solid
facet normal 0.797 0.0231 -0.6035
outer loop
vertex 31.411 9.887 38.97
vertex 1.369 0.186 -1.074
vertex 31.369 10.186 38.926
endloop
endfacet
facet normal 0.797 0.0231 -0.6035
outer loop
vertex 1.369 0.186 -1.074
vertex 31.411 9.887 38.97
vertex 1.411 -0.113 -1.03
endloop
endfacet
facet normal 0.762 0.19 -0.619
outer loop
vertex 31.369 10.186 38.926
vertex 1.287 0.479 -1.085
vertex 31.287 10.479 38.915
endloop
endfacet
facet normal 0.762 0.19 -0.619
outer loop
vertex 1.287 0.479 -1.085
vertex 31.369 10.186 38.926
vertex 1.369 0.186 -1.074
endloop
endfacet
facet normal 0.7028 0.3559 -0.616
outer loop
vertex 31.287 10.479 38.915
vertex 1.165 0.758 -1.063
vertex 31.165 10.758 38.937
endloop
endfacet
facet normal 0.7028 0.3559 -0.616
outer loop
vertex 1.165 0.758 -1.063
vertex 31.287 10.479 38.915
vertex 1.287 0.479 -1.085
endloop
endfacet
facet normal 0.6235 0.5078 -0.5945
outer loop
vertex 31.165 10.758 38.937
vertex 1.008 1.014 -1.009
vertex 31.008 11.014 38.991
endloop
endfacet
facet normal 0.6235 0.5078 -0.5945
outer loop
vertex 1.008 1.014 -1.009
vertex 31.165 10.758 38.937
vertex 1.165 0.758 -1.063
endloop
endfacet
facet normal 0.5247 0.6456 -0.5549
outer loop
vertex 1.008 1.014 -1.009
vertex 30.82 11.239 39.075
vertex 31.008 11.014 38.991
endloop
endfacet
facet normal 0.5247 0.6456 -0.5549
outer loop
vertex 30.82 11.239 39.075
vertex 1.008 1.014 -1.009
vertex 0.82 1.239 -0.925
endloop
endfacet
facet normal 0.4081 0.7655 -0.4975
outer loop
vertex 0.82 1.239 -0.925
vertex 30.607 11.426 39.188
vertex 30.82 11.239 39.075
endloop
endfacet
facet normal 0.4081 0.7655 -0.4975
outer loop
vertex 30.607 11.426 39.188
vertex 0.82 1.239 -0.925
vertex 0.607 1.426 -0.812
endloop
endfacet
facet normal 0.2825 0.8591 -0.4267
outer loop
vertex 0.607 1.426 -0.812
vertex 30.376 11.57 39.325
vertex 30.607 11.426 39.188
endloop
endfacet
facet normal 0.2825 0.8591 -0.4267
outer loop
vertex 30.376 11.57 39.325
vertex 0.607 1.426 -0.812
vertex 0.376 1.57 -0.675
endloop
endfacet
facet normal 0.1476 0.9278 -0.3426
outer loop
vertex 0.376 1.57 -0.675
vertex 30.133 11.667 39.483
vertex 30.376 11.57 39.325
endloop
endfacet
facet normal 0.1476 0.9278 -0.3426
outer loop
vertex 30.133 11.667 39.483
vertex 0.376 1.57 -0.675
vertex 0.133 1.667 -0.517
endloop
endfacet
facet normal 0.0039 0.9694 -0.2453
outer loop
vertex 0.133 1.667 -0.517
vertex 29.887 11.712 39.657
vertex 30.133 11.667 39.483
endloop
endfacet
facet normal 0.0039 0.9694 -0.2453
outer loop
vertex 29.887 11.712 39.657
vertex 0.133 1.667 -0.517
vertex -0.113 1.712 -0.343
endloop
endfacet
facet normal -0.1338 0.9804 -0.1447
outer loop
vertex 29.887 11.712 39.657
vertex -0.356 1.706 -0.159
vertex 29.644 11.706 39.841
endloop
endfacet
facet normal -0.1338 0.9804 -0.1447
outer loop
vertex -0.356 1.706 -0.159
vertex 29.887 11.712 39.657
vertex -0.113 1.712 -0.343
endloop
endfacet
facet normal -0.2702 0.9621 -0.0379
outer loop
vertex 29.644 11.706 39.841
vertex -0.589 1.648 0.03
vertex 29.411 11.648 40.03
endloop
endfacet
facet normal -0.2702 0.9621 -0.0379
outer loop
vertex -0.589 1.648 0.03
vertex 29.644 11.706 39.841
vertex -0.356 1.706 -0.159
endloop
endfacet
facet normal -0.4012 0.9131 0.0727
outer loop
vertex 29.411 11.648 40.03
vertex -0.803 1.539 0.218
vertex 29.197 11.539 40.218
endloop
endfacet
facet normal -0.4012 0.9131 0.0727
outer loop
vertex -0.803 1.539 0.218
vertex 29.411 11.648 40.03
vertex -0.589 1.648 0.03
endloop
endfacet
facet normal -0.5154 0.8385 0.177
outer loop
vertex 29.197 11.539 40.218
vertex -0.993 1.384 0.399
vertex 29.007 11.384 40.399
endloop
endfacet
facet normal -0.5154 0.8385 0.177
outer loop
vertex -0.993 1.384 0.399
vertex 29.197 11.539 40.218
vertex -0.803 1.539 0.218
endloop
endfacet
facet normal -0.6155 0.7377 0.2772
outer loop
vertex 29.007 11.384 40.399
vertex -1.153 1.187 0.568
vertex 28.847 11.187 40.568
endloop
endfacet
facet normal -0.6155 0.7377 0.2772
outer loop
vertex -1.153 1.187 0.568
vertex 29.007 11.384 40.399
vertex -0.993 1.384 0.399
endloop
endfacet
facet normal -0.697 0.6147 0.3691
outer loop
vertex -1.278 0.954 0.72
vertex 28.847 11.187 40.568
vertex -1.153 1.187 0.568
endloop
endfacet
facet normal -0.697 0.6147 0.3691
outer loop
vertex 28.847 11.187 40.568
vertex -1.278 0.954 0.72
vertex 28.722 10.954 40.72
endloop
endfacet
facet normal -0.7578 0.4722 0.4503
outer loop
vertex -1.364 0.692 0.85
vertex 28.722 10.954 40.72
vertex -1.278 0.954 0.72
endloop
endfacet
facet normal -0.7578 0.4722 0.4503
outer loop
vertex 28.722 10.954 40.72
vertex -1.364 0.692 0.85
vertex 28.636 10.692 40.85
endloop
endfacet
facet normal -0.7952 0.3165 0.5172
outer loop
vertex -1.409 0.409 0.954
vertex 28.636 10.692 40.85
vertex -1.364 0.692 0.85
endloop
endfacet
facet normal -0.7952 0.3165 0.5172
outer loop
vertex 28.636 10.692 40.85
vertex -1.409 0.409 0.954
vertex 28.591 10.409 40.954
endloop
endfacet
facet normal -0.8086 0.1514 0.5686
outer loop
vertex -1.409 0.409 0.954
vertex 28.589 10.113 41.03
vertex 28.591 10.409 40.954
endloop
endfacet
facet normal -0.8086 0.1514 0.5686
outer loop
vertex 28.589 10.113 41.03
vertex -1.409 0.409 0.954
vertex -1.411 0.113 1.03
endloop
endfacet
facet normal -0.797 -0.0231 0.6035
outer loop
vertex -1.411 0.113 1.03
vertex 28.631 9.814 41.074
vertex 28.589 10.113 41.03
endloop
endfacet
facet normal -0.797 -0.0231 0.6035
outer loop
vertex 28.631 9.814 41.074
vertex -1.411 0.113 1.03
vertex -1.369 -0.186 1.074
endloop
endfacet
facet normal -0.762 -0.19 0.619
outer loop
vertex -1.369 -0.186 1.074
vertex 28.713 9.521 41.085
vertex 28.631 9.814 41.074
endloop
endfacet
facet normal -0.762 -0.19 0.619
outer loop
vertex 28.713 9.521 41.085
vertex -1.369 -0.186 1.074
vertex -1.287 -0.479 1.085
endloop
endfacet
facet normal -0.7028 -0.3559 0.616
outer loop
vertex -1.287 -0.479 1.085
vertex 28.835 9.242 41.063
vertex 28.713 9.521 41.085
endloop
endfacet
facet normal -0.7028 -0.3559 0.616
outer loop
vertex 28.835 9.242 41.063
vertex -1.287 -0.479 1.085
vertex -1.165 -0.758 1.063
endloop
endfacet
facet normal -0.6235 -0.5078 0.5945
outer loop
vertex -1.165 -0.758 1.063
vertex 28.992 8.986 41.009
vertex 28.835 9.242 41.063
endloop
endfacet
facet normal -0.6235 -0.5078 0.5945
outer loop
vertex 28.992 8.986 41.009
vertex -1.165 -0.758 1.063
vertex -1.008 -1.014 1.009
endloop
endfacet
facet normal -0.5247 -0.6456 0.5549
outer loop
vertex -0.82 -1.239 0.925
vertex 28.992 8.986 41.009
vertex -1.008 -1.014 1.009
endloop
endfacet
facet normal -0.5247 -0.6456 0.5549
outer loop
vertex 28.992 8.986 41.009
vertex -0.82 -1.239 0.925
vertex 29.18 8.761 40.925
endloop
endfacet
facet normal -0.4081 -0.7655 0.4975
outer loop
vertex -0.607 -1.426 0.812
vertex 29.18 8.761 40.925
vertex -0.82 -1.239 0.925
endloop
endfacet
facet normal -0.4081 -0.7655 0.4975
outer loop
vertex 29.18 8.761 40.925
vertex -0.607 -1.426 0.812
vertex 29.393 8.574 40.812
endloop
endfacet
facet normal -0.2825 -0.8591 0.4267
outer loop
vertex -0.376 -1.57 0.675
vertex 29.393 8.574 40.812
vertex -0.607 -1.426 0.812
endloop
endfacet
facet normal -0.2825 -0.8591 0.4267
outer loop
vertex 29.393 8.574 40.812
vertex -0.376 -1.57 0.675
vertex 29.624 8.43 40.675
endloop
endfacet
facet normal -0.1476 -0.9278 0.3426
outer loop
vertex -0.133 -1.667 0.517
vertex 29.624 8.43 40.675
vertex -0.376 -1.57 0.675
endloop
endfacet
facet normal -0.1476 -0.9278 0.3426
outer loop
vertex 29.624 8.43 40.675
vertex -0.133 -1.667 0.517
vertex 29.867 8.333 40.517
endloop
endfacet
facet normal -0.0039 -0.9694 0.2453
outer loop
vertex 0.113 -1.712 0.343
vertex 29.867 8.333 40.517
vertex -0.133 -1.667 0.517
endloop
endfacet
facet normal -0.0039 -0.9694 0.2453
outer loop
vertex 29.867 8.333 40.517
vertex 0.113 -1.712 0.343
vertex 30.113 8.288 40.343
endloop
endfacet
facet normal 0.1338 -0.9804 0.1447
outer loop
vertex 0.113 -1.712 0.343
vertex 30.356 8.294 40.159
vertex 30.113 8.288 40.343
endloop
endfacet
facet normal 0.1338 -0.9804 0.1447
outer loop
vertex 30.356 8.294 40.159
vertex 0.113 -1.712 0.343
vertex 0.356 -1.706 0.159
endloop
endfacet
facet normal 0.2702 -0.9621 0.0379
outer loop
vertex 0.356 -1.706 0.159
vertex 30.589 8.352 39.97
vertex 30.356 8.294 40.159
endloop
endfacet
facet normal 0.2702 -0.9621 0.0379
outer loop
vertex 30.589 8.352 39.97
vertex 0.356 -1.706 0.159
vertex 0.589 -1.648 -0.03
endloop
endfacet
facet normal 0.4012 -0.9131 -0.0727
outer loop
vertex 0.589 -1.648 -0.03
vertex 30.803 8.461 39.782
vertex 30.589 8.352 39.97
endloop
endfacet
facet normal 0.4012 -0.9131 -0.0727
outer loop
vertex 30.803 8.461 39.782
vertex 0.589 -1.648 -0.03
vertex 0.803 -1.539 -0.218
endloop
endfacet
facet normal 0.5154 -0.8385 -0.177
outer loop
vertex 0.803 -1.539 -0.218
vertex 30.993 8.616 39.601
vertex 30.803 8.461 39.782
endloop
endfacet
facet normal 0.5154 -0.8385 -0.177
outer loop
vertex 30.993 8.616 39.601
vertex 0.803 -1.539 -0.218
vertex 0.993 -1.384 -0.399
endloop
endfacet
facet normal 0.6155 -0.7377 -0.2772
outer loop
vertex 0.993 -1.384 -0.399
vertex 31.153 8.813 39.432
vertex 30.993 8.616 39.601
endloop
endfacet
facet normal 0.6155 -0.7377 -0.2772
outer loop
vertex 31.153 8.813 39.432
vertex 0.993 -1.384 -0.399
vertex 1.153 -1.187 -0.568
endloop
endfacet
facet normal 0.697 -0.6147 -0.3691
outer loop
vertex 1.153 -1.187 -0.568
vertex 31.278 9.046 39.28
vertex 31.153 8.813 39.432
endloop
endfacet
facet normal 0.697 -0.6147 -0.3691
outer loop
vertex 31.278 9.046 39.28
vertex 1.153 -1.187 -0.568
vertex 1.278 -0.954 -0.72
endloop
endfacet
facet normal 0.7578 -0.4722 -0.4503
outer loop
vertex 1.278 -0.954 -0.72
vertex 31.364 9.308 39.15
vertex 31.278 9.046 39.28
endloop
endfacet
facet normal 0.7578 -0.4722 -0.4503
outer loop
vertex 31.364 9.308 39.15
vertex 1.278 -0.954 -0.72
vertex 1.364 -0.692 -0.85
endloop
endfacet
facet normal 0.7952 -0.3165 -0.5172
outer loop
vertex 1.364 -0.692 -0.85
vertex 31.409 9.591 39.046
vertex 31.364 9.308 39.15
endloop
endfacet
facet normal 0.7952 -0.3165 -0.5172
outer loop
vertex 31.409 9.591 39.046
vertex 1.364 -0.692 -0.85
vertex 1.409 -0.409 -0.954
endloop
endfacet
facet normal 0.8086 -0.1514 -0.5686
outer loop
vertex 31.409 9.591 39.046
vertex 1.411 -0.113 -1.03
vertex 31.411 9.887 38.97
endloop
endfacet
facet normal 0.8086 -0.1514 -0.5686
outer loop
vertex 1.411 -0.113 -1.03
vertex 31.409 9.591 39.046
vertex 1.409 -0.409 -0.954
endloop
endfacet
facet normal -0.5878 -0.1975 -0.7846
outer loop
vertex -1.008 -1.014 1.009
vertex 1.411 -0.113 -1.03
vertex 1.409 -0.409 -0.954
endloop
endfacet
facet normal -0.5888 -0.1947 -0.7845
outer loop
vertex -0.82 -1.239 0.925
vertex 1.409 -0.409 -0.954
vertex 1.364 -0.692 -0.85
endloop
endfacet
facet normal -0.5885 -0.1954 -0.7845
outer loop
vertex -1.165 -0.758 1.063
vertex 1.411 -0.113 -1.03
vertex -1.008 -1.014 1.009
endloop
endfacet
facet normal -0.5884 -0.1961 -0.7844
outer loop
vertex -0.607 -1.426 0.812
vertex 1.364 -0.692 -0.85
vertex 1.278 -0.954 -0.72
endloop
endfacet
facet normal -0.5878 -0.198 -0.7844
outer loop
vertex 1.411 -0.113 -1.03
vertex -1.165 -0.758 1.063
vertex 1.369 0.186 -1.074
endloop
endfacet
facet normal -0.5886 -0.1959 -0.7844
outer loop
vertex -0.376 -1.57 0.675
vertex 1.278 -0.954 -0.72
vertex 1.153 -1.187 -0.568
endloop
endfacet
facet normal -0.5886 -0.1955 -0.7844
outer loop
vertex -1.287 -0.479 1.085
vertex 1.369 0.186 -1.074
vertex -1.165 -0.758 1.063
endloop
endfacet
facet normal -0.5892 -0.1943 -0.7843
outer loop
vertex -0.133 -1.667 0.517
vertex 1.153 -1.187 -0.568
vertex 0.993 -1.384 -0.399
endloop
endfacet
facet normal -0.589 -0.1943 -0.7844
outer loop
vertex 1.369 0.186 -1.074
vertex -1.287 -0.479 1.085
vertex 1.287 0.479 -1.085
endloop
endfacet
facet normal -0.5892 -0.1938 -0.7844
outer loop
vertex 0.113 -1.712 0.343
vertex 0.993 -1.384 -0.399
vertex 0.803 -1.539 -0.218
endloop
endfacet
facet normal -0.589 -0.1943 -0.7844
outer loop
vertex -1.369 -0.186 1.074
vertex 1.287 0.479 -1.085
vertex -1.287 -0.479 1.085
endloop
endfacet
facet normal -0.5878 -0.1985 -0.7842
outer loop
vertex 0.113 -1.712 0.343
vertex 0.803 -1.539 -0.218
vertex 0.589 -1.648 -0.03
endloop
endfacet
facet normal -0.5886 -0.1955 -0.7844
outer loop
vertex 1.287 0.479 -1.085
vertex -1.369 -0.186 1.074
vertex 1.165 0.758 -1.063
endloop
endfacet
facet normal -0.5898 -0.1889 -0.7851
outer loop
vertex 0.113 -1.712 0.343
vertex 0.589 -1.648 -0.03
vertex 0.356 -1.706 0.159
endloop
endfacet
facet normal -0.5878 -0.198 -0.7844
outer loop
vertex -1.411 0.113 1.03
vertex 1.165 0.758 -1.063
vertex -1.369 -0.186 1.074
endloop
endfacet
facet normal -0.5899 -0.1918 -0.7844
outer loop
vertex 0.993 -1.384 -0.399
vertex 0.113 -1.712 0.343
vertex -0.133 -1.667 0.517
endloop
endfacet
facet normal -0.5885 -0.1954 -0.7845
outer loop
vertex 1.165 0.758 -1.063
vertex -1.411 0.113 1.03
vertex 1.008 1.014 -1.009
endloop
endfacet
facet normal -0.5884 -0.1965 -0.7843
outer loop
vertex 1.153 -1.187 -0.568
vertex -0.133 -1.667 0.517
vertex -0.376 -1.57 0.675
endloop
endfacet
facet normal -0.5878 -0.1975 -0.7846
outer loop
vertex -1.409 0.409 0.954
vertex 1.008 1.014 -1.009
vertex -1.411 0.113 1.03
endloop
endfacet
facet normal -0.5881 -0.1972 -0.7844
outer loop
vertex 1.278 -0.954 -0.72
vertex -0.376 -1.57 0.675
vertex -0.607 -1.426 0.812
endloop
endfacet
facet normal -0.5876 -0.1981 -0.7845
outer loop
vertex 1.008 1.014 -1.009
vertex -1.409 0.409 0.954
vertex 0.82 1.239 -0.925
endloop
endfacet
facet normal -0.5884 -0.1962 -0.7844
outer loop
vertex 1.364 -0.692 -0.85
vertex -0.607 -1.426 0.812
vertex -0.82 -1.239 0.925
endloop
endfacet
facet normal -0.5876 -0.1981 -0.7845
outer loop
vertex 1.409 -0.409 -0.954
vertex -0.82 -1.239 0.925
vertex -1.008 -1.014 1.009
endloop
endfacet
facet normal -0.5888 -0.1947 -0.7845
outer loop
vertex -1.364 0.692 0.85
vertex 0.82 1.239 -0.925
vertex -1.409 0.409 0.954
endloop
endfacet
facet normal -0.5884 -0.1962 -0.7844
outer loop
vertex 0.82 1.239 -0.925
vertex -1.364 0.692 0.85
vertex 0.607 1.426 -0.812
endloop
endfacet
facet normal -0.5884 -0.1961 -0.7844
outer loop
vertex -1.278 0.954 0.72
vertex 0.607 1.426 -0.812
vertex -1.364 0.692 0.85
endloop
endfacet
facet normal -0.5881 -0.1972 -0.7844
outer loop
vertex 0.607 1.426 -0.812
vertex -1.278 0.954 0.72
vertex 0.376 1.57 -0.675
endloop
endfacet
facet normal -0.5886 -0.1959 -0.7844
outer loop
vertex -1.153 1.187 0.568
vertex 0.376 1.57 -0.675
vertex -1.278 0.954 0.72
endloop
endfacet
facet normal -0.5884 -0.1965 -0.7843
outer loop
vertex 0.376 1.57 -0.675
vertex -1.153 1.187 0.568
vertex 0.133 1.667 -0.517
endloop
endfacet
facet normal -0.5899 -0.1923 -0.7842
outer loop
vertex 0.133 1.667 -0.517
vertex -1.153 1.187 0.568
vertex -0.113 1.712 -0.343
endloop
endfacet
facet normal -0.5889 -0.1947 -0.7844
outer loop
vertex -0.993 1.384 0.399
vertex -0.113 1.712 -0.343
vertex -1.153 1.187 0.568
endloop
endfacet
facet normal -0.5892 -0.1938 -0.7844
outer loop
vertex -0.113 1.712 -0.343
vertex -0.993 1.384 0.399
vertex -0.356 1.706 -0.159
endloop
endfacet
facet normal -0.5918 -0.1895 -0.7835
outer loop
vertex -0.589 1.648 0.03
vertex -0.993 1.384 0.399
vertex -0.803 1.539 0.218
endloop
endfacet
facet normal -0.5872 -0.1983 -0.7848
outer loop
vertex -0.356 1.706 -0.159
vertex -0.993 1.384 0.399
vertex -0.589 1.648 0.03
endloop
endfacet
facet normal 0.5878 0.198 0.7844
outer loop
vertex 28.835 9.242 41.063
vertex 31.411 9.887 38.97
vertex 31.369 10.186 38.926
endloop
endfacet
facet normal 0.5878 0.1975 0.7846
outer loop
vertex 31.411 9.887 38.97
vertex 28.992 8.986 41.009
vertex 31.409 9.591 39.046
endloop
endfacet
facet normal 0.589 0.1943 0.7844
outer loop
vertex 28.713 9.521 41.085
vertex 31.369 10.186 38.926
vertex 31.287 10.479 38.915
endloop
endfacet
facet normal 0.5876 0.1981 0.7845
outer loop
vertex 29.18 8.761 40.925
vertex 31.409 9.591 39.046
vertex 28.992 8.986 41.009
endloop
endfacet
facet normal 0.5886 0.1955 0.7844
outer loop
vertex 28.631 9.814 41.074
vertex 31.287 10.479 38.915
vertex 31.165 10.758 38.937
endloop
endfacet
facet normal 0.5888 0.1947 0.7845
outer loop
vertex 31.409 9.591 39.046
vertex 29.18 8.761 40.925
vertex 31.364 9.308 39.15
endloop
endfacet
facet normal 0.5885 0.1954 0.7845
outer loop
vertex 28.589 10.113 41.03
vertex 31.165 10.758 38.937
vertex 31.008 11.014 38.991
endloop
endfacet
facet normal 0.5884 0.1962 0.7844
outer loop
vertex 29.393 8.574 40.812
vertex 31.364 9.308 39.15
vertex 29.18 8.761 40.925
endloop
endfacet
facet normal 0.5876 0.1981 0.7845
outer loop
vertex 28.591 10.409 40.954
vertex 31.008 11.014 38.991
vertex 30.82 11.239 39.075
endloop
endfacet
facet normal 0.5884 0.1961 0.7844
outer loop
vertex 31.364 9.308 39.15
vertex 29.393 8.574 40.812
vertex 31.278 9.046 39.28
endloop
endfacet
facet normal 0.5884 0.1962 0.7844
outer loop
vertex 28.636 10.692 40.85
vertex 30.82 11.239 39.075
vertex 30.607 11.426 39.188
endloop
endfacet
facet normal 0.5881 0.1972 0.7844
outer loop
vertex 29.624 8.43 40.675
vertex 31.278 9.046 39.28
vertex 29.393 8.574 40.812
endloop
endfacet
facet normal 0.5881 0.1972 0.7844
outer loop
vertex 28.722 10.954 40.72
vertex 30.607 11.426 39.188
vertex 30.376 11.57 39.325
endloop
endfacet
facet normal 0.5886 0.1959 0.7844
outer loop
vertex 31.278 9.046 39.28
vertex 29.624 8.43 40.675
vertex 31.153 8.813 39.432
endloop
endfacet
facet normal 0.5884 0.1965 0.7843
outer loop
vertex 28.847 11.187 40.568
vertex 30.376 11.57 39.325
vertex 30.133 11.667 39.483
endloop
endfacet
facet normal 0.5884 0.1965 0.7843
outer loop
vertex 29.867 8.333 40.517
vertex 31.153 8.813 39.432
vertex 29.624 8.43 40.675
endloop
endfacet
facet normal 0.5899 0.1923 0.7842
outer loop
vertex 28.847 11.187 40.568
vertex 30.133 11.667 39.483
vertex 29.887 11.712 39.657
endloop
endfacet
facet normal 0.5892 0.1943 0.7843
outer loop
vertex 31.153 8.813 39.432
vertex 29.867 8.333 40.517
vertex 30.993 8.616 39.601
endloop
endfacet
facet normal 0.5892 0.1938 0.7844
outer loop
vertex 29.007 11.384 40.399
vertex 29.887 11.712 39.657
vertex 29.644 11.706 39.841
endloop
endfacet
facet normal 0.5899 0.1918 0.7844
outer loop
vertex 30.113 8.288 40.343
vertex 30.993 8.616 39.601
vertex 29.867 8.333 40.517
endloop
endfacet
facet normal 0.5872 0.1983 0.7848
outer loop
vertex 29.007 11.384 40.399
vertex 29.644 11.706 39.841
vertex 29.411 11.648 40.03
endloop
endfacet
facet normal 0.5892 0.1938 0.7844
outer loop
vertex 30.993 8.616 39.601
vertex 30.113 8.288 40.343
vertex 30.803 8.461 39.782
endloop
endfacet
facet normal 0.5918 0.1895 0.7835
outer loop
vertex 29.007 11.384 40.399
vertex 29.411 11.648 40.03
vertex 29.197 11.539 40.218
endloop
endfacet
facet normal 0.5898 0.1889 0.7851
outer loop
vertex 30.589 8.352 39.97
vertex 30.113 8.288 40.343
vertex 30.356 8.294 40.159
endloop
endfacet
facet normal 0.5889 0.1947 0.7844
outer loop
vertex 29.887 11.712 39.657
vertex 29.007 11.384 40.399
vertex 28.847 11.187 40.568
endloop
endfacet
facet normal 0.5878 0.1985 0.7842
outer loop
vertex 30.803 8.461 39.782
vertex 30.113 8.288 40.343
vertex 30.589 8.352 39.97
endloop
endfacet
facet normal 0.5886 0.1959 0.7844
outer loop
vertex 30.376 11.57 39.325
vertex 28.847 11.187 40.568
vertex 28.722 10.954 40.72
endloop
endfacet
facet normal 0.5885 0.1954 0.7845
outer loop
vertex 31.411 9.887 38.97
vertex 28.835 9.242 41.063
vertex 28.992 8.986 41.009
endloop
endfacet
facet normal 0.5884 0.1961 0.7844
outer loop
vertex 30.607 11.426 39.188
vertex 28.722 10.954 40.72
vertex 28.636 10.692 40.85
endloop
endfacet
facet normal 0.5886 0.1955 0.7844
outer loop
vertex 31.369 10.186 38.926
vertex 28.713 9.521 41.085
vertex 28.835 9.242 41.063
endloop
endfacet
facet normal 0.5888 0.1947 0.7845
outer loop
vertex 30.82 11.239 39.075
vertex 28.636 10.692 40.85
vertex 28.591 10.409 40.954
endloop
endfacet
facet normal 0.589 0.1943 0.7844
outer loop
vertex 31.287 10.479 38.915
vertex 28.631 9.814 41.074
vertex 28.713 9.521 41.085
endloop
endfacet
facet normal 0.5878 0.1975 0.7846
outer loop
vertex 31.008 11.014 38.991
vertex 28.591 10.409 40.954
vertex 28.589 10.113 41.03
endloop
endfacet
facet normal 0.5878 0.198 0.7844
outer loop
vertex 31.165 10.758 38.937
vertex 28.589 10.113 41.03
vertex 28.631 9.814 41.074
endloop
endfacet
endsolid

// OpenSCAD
// Reusable tube-between-points pattern for roll cages, braces, and frames.

$fn = 36;

function vsub(a, b) = [a[0] - b[0], a[1] - b[1], a[2] - b[2]];
function vlen(v) = sqrt(v[0] * v[0] + v[1] * v[1] + v[2] * v[2]);
function vcross(a, b) = [
    a[1] * b[2] - a[2] * b[1],
    a[2] * b[0] - a[0] * b[2],
    a[0] * b[1] - a[1] * b[0]
];

module tube_between_points(p1, p2, radius = 1.5) {
    v = vsub(p2, p1);
    l = vlen(v);
    axis = vcross([0, 0, 1], v);
    axis_len = vlen(axis);
    angle = l == 0 ? 0 : acos(v[2] / l);

    if (l > 0.01)
        translate(p1)
            rotate(a = angle, v = axis_len < 0.01 ? [1, 0, 0] : axis)
                cylinder(r = radius, h = l);
}

// Example
tube_between_points([0, 0, 0], [30, 10, 40], 1.75);
